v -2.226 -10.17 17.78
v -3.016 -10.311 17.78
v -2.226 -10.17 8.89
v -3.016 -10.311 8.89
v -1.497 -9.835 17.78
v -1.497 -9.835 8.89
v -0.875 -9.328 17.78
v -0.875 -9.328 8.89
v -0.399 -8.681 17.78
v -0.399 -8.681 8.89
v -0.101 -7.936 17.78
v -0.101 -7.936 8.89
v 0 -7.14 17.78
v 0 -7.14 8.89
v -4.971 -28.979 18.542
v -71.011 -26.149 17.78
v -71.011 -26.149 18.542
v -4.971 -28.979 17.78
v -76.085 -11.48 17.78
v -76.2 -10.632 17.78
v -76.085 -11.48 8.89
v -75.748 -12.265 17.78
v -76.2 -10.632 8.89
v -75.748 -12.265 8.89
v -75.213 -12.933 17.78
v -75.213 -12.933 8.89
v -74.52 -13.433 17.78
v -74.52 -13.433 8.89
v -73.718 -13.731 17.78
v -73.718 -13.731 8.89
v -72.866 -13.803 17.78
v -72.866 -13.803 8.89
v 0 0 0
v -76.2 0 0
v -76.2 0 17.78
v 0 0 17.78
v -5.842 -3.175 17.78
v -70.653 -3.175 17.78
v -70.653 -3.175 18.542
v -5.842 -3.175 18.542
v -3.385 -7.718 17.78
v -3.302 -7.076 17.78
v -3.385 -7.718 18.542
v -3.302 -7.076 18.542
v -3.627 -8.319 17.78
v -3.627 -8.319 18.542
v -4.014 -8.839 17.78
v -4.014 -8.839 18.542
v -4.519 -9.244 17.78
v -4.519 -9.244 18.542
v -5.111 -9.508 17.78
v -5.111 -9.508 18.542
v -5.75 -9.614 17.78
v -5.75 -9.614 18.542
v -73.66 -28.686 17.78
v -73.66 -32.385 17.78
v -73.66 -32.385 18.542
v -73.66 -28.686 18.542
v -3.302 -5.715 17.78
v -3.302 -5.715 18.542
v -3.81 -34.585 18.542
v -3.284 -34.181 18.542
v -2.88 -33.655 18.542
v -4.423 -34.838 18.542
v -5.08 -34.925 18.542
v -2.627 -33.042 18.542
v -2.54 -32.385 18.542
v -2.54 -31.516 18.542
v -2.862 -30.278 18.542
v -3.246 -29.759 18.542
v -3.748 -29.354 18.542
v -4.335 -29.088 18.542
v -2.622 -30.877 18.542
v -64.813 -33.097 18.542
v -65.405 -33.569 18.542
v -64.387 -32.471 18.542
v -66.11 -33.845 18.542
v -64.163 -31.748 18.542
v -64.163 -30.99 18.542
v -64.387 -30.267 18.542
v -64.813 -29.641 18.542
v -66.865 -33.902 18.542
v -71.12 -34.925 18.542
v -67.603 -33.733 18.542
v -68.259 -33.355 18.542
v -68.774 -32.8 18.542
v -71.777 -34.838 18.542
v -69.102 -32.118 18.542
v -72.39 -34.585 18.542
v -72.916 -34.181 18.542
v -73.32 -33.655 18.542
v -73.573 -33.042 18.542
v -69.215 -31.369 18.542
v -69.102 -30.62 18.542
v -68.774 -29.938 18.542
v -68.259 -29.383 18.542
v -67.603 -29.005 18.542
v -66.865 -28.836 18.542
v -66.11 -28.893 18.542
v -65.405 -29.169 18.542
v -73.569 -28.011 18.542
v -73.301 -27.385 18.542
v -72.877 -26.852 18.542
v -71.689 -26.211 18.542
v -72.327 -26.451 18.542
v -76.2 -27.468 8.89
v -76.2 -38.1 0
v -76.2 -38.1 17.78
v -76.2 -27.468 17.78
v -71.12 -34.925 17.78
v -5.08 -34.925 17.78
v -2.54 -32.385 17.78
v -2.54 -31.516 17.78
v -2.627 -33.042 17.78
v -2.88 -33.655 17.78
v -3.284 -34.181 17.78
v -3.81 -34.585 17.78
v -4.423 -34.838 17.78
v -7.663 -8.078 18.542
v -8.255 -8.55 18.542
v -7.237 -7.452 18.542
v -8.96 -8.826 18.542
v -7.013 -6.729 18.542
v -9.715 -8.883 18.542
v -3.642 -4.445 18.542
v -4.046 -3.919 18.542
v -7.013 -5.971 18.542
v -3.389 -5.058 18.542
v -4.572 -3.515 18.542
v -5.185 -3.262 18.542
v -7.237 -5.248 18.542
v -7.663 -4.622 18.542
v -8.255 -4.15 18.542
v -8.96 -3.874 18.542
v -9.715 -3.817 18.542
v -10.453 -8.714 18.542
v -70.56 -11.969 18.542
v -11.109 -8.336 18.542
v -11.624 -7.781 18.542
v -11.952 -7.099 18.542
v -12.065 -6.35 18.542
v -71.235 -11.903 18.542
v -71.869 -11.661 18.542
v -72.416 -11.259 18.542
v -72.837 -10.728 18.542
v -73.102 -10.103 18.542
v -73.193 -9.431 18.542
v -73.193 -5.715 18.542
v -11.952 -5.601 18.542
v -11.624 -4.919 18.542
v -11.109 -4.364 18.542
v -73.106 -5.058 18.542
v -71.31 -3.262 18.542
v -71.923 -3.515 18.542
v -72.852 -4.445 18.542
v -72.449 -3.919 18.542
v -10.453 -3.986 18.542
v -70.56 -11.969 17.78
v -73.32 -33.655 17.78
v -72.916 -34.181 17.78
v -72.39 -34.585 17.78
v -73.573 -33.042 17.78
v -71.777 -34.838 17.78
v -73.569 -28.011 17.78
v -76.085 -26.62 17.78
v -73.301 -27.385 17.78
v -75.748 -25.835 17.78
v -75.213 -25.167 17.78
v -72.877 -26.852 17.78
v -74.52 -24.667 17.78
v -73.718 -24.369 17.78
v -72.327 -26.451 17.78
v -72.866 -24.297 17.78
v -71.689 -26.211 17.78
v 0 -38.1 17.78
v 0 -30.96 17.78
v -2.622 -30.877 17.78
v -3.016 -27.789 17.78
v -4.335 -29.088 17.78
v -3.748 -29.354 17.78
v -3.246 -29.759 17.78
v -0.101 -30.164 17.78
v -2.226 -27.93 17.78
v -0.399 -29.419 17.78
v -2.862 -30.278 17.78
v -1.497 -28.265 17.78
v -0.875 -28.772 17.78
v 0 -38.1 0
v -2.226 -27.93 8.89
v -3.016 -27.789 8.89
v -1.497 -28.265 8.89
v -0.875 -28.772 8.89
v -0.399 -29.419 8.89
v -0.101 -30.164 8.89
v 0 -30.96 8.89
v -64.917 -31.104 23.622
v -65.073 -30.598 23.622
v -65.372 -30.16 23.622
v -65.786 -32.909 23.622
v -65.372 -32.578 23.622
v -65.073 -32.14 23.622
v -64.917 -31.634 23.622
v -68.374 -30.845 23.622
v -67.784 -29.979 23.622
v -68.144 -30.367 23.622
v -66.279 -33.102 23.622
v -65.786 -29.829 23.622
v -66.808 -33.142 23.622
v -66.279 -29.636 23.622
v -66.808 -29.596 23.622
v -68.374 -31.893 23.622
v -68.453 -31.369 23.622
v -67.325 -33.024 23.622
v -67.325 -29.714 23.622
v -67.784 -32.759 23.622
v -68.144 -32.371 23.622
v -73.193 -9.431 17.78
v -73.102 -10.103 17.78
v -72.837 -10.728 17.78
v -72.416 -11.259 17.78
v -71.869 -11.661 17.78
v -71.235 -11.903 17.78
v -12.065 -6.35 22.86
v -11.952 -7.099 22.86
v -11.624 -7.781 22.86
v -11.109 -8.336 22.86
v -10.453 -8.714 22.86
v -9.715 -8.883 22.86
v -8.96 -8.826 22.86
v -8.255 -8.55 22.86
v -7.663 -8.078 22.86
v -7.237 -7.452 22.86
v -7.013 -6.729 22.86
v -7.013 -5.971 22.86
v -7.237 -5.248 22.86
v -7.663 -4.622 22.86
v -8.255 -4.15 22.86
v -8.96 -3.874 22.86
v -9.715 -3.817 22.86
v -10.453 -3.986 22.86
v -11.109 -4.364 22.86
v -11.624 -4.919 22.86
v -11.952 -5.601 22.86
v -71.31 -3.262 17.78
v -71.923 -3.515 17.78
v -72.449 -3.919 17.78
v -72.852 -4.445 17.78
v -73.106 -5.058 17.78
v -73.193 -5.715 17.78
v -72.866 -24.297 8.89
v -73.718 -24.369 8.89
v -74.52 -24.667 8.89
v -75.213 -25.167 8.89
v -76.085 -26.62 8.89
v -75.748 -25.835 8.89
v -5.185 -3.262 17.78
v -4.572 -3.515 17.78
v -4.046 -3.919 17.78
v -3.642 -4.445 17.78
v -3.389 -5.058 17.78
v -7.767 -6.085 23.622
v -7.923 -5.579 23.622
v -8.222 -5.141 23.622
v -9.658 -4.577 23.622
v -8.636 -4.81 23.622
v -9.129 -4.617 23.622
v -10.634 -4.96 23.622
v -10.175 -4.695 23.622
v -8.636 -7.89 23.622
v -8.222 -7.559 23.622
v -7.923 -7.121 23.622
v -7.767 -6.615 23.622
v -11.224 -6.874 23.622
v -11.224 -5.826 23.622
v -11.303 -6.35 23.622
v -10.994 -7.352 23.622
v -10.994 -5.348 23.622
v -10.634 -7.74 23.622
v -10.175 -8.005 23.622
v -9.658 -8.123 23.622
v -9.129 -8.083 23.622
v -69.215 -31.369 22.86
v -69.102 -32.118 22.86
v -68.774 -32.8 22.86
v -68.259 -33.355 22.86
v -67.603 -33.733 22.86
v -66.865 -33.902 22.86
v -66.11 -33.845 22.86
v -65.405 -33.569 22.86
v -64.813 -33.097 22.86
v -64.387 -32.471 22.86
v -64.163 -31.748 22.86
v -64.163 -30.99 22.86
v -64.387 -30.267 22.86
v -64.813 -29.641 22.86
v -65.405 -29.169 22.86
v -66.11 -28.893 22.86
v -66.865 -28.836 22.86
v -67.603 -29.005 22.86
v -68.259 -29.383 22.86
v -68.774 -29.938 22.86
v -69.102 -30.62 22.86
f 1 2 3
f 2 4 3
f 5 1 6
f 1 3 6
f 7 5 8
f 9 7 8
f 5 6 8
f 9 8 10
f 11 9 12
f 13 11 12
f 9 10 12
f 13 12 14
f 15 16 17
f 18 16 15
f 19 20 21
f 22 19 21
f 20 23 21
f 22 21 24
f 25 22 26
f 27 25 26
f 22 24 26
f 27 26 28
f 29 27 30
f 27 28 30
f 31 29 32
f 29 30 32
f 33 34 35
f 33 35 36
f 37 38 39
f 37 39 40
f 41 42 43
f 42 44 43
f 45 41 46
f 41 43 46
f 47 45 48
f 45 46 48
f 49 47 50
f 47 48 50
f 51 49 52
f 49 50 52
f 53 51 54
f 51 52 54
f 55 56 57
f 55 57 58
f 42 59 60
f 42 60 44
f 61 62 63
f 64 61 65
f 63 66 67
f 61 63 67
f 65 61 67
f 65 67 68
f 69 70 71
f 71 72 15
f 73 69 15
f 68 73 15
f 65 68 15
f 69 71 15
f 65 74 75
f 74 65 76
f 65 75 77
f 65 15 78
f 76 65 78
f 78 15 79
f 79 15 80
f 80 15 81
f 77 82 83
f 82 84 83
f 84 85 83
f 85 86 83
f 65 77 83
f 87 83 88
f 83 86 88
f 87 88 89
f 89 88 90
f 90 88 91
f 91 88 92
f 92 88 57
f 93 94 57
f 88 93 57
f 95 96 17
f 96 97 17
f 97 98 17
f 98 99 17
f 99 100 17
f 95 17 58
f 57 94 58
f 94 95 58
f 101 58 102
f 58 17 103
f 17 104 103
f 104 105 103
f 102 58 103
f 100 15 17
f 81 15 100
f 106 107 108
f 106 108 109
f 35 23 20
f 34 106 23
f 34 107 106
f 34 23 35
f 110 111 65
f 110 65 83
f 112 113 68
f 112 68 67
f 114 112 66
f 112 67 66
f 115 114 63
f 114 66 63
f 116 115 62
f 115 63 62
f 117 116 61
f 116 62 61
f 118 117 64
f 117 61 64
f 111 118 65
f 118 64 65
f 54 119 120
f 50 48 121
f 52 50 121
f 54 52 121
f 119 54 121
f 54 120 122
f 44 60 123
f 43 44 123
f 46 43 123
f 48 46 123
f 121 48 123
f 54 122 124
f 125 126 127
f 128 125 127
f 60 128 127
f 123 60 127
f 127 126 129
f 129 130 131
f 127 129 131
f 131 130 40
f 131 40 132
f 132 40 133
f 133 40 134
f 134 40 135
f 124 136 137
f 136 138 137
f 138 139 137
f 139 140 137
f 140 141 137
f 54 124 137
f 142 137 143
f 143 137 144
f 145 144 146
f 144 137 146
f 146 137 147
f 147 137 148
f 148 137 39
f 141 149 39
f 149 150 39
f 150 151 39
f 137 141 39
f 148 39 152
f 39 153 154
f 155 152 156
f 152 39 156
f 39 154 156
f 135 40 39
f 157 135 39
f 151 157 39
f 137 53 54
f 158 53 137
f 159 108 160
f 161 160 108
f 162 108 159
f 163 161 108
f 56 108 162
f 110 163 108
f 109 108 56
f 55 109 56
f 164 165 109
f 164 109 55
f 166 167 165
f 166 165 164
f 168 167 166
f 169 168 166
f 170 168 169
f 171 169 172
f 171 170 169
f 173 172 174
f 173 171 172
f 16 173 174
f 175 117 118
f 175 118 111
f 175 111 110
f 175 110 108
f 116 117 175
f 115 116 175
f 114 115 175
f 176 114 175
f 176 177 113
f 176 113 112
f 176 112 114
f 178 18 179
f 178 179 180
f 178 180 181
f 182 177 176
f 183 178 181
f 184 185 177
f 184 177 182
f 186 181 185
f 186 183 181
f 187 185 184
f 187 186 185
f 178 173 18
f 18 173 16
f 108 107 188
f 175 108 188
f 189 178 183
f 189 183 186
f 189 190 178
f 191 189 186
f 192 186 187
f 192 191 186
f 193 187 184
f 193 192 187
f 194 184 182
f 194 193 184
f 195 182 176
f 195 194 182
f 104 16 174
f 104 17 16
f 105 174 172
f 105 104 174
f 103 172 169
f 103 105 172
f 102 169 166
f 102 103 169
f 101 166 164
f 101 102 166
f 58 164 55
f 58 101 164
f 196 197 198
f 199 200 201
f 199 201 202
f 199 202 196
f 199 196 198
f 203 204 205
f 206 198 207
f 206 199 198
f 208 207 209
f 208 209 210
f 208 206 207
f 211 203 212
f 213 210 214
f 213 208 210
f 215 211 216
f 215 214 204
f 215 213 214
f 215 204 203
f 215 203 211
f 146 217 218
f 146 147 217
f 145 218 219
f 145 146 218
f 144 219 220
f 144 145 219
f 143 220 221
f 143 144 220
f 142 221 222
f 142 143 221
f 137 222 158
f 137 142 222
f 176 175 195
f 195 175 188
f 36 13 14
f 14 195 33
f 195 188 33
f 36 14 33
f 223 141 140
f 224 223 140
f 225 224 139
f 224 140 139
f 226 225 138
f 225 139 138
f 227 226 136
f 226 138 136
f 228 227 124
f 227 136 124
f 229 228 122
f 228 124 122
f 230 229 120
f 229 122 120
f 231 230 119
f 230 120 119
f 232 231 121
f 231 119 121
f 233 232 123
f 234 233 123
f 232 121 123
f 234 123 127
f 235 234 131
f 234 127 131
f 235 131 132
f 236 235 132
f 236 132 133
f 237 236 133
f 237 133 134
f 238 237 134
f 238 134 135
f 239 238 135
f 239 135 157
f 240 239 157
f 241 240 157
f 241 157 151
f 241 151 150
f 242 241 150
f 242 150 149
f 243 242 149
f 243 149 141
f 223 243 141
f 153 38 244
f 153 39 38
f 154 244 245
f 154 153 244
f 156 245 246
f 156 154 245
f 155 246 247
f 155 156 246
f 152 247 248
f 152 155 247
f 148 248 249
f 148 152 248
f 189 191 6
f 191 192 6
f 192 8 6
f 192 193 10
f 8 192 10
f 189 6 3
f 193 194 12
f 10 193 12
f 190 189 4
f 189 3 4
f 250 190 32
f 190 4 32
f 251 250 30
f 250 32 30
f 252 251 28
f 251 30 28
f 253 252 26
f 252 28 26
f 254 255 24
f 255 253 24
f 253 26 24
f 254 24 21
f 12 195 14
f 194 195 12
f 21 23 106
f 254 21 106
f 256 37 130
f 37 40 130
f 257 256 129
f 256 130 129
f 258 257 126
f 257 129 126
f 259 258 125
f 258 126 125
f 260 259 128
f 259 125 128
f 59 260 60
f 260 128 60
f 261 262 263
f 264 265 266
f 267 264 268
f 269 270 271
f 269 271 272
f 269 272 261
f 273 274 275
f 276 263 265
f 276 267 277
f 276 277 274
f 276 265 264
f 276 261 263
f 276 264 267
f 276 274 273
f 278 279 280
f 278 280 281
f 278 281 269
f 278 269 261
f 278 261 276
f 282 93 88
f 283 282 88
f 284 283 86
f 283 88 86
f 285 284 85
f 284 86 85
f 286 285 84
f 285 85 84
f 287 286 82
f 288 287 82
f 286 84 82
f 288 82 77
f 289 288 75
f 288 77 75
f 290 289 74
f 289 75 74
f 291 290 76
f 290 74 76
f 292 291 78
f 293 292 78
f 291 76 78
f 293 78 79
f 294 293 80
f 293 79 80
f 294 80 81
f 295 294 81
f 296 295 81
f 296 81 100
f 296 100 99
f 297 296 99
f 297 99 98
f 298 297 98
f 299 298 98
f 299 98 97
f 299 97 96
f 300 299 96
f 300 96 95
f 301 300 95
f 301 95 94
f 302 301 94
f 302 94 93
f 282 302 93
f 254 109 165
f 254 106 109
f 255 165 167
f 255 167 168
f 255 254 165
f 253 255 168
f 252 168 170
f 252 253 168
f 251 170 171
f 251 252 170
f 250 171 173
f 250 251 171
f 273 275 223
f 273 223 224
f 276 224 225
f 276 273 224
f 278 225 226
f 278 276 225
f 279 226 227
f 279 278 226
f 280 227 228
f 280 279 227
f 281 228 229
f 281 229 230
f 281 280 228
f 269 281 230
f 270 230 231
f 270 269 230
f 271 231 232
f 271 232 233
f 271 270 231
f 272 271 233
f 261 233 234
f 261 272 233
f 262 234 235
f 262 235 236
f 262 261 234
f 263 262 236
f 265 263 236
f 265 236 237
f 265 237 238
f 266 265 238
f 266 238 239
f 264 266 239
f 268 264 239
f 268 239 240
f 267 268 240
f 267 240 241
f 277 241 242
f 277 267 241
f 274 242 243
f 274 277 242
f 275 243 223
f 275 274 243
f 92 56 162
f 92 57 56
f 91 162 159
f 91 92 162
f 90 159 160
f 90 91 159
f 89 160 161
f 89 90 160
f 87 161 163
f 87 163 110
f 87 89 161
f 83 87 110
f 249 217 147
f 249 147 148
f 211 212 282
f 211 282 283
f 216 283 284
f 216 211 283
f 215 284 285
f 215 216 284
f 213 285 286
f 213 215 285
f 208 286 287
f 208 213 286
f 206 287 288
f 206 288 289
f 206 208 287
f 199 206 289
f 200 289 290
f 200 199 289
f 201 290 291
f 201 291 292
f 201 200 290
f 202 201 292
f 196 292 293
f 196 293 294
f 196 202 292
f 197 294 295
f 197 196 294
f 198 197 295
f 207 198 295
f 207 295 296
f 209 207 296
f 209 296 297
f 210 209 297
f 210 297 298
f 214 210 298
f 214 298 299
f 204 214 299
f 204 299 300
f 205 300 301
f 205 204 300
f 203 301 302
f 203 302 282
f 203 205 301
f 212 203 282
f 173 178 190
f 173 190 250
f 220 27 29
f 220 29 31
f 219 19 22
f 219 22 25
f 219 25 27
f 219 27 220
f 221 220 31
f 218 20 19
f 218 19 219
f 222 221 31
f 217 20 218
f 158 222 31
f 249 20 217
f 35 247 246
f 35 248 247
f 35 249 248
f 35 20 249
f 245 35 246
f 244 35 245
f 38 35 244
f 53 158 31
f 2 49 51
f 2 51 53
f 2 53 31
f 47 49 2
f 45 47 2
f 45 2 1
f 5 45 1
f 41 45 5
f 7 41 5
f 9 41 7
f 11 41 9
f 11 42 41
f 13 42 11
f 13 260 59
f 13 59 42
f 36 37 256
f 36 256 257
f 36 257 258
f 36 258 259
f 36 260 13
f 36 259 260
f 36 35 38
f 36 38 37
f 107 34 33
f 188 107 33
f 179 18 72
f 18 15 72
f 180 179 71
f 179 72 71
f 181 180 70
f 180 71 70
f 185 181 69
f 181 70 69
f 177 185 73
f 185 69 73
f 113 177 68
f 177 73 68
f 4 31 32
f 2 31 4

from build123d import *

# Parameters (mm, degrees)
SKETCH1_W           = 76.2
SKETCH1_H           = 38.1
BOSS_EXTRUDE1_DEPTH = 17.78
CUT_EXTRUDE1_DEPTH  = 8.89
FILLET1_R           = 3.175
SKETCH3_R           = 2.54
BOSS_EXTRUDE2_DEPTH = 5.842
CHAMFER1_SIZE       = 0.762
BOSS_EXTRUDE3_DEPTH = 0.762
FILLET2_R           = 2.54
BOSS_EXTRUDE4_DEPTH = 0.762
FILLET3_R           = 2.54


with BuildPart() as part:
    # Sketch1 → Boss-Extrude1 (new body)
    with BuildSketch(Plane.XY):
        with Locations((-38.1, -19.05)):
            Rectangle(SKETCH1_W, SKETCH1_H)
    extrude(amount=BOSS_EXTRUDE1_DEPTH)

    # Sketch2 → Cut-Extrude1 (cut)
    with BuildSketch(Plane.XY.offset(17.78)):
        Polygon((-76.2, -24.13), (-76.2, -13.97), (0, -10.16), (0, -27.94), align=None)
    extrude(amount=-CUT_EXTRUDE1_DEPTH, mode=Mode.SUBTRACT)

    # Fillet1
    fillet1_edges = [part.edges().sort_by_distance(p)[0] for p in [
        (-76.2, -13.97, 13.335),
        (0, -10.16, 13.335),
        (0, -27.94, 13.335),
        (-76.2, -24.13, 13.335),
    ]]
    fillet(fillet1_edges, radius=FILLET1_R)

    # Sketch3 → Boss-Extrude2 (add)
    with BuildSketch(Plane.XY.offset(17.78)):
        with Locations(Location((-9.525, -6.35, 0), (0, 0, 180))):
            Circle(SKETCH3_R)
        with Locations(Location((-66.675, -31.369, 0), (0, 0, 180))):
            Circle(SKETCH3_R)
    extrude(amount=BOSS_EXTRUDE2_DEPTH)

    # Chamfer1
    chamfer1_edges = [part.edges().sort_by_distance(p)[0] for p in [
        (-6.985, -6.35, 23.622),
        (-64.135, -31.369, 23.622),
    ]]
    chamfer(chamfer1_edges, length=CHAMFER1_SIZE)

    # Sketch4 → Boss-Extrude3 (add)
    with BuildSketch(Plane.XY.offset(17.78)):
        Polygon((-73.66, -26.035), (-2.54, -29.083), (-2.54, -34.925), (-73.66, -34.925), align=None)
    extrude(amount=BOSS_EXTRUDE3_DEPTH)

    # Fillet2
    fillet2_edges = [part.edges().sort_by_distance(p)[0] for p in [
        (-73.66, -26.035, 18.161),
        (-73.66, -34.925, 18.161),
        (-2.54, -34.925, 18.161),
        (-2.54, -29.083, 18.161),
    ]]
    fillet(fillet2_edges, radius=FILLET2_R)

    # Sketch5 → Boss-Extrude4 (add)
    with BuildSketch(Plane.XY.offset(17.78)):
        Polygon((-73.192591087, -3.175), (-3.302, -3.175), (-3.302, -9.525), (-73.192591087, -12.065), align=None)
    extrude(amount=BOSS_EXTRUDE4_DEPTH)

    # Fillet3
    fillet3_edges = [part.edges().sort_by_distance(p)[0] for p in [
        (-73.192591087, -3.175, 18.161),
        (-73.192591087, -12.065, 18.161),
        (-3.302, -9.525, 18.161),
        (-3.302, -3.175, 18.161),
    ]]
    fillet(fillet3_edges, radius=FILLET3_R)


solid = part.part
